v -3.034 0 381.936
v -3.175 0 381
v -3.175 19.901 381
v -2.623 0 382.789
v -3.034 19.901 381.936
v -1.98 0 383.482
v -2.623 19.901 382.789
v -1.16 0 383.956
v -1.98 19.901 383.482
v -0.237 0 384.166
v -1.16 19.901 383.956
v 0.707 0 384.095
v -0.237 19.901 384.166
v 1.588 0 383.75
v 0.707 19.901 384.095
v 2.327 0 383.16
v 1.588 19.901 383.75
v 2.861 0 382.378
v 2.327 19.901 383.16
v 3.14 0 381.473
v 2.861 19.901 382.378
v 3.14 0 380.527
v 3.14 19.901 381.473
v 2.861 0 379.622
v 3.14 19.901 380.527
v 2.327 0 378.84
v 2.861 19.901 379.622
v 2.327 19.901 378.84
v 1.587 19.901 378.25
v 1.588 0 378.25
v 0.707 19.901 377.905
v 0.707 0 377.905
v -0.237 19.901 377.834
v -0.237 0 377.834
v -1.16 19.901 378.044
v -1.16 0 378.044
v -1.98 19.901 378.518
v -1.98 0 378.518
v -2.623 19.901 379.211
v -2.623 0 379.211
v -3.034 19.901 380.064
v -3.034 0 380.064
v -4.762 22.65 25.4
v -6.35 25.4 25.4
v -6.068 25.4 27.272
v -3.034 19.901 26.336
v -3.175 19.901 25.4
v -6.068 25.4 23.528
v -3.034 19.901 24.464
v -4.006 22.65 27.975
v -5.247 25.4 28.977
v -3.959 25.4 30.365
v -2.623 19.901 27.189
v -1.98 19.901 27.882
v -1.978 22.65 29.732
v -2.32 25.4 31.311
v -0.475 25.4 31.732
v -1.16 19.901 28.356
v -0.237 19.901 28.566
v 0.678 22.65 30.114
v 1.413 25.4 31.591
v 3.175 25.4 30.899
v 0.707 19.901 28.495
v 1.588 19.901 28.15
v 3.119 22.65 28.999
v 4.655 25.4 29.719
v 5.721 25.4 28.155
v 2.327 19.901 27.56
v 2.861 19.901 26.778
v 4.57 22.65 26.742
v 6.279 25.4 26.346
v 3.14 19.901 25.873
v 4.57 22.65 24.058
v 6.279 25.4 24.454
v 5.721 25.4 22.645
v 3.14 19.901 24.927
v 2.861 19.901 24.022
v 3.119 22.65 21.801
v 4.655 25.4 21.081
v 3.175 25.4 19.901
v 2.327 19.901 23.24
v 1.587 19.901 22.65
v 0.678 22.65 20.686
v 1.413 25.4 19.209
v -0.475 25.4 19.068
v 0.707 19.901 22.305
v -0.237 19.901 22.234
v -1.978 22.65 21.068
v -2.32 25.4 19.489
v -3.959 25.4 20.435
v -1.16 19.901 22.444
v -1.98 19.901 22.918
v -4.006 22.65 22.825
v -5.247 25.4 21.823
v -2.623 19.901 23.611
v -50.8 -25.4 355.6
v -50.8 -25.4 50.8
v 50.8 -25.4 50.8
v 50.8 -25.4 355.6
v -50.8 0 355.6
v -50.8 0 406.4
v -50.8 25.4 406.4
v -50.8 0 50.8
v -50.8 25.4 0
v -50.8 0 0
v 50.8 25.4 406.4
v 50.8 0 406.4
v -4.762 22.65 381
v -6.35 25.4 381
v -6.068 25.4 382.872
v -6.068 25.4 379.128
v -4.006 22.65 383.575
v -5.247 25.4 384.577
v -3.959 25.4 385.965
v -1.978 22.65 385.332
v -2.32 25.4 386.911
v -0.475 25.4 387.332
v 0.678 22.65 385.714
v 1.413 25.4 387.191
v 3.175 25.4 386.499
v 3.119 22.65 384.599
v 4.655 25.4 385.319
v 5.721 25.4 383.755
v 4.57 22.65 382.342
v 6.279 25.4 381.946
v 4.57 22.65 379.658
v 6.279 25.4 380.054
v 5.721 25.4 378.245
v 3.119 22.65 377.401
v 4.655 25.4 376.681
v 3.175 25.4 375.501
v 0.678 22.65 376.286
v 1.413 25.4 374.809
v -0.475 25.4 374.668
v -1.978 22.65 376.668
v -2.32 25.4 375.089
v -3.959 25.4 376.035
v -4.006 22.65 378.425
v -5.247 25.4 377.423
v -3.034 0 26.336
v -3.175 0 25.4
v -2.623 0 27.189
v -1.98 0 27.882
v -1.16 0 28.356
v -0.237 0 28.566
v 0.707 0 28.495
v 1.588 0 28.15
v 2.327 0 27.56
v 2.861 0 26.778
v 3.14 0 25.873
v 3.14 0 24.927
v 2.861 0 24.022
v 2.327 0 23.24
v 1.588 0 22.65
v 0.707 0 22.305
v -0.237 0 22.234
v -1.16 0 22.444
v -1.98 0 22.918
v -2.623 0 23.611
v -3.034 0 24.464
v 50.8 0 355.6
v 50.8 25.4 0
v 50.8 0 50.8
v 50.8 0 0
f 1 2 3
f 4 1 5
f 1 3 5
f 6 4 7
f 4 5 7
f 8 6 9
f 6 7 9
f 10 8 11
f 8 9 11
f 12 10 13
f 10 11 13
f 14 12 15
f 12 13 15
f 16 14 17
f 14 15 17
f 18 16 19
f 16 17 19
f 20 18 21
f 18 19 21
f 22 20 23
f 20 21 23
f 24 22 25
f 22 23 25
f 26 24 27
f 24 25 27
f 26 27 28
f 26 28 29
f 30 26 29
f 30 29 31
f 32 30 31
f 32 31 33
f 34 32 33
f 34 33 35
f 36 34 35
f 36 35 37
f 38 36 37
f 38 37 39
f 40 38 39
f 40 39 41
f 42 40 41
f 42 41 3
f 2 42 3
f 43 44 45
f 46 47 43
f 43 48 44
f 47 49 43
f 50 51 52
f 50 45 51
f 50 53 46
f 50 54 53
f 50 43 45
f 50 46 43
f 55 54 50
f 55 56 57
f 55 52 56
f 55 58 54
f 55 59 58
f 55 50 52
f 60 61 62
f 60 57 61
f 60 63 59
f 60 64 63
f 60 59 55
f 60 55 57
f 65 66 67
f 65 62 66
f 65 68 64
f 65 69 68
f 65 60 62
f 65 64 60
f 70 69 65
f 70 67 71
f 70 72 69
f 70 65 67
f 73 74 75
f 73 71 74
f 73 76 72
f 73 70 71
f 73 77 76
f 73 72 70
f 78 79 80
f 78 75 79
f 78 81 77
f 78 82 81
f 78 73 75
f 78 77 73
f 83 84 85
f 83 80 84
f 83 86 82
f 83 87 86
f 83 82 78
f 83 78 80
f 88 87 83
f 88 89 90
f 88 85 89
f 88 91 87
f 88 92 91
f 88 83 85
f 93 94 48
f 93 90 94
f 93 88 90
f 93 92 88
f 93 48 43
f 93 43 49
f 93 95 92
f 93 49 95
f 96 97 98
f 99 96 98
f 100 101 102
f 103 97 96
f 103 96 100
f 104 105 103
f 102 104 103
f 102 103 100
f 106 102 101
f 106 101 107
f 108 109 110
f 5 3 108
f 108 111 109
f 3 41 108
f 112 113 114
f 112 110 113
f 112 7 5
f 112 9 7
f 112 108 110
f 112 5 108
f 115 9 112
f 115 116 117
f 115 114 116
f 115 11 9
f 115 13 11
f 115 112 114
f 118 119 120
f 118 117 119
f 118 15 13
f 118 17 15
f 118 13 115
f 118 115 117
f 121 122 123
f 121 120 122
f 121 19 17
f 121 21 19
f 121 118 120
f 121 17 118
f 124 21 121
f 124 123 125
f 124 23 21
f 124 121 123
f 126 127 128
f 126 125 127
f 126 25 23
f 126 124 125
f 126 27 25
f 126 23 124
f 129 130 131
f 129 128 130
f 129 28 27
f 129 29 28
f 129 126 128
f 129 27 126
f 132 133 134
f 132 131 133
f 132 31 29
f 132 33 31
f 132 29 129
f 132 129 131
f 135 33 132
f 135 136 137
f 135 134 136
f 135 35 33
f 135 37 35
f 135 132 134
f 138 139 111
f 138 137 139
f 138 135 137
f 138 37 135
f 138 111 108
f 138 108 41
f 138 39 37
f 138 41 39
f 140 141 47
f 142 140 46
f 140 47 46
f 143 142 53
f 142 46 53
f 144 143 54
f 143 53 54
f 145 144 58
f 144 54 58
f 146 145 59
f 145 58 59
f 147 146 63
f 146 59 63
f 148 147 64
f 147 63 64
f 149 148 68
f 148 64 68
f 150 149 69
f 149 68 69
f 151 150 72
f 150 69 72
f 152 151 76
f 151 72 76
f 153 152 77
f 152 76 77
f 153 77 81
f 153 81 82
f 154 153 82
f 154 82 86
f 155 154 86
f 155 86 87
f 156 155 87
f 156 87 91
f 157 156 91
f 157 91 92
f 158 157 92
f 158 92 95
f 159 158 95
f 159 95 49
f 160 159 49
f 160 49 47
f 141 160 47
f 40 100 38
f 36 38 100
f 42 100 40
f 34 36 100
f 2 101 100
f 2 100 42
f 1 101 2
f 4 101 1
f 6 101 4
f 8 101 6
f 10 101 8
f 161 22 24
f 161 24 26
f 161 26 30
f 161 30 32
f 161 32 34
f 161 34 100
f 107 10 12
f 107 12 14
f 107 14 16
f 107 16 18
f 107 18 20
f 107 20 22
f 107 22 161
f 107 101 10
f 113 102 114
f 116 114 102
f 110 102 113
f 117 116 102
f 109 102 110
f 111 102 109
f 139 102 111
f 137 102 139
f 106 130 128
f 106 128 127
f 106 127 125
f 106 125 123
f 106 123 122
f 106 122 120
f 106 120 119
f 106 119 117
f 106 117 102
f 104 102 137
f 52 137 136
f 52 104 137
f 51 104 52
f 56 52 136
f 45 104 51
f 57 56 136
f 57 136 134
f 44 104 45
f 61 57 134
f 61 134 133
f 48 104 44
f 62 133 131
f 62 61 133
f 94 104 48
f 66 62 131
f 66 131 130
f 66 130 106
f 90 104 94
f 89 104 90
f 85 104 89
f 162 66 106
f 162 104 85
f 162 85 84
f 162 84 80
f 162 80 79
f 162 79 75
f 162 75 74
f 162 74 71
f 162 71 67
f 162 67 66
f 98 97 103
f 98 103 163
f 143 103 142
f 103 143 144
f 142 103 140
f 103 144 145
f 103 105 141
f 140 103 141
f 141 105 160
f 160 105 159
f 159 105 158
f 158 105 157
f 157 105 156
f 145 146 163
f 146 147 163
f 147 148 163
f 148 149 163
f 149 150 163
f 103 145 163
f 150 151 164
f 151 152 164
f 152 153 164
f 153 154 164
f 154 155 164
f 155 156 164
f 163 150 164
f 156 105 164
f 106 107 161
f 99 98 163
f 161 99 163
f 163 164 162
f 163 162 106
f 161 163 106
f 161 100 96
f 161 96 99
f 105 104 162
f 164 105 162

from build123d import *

# Parameters (mm, degrees)
F0_W     = 101.6
F0_H     = 50.8
F1_DEPTH = 406.4
F2_W     = 101.6
F2_H     = 25.4
F3_DEPTH = 50.8
F4_W     = 101.6
F4_H     = 25.4
F5_DEPTH = 50.8
F6_R     = 3.175
F7_DEPTH = 50.801
F8_R     = 6.35
F9_DEPTH = 6.35
F9_TAPER = 30


with BuildPart() as f1:
    # F0 (on Top) → F1 (new body)
    with BuildSketch(Plane.XY):
        Rectangle(F0_W, F0_H)
    extrude(amount=F1_DEPTH)

    # F2 (on face) → F3 (cut)
    with BuildSketch(Plane.XY.offset(406.4)):
        with Locations((0, -12.7)):
            Rectangle(F2_W, F2_H)
    extrude(amount=-F3_DEPTH, mode=Mode.SUBTRACT)

    # F4 (on face) → F5 (cut)
    with BuildSketch(Plane(origin=(0, 0, 0), x_dir=(1, 0, 0), z_dir=(0, 0, -1))):
        with Locations((0, 12.7)):
            Rectangle(F4_W, F4_H)
    extrude(amount=-F5_DEPTH, mode=Mode.SUBTRACT)

    # F6 (on face) → F7 (cut, through all)
    with BuildSketch(Plane(origin=(0, 25.4, 0), x_dir=(-1, 0, 0), z_dir=(0, 1, 0))):
        with Locations((0, 381)):
            Circle(F6_R)
        with Locations((0, 25.4)):
            Circle(F6_R)
    extrude(amount=-F7_DEPTH, mode=Mode.SUBTRACT)

    # F8 (on face) → F9 (cut)
    with BuildSketch(Plane(origin=(0, 25.4, 0), x_dir=(-1, 0, 0), z_dir=(0, 1, 0))):
        with Locations((0, 381)):
            Circle(F8_R)
        with Locations((0, 25.4)):
            Circle(F8_R)
    extrude(amount=-F9_DEPTH, taper=F9_TAPER, mode=Mode.SUBTRACT)


solid = f1.part
